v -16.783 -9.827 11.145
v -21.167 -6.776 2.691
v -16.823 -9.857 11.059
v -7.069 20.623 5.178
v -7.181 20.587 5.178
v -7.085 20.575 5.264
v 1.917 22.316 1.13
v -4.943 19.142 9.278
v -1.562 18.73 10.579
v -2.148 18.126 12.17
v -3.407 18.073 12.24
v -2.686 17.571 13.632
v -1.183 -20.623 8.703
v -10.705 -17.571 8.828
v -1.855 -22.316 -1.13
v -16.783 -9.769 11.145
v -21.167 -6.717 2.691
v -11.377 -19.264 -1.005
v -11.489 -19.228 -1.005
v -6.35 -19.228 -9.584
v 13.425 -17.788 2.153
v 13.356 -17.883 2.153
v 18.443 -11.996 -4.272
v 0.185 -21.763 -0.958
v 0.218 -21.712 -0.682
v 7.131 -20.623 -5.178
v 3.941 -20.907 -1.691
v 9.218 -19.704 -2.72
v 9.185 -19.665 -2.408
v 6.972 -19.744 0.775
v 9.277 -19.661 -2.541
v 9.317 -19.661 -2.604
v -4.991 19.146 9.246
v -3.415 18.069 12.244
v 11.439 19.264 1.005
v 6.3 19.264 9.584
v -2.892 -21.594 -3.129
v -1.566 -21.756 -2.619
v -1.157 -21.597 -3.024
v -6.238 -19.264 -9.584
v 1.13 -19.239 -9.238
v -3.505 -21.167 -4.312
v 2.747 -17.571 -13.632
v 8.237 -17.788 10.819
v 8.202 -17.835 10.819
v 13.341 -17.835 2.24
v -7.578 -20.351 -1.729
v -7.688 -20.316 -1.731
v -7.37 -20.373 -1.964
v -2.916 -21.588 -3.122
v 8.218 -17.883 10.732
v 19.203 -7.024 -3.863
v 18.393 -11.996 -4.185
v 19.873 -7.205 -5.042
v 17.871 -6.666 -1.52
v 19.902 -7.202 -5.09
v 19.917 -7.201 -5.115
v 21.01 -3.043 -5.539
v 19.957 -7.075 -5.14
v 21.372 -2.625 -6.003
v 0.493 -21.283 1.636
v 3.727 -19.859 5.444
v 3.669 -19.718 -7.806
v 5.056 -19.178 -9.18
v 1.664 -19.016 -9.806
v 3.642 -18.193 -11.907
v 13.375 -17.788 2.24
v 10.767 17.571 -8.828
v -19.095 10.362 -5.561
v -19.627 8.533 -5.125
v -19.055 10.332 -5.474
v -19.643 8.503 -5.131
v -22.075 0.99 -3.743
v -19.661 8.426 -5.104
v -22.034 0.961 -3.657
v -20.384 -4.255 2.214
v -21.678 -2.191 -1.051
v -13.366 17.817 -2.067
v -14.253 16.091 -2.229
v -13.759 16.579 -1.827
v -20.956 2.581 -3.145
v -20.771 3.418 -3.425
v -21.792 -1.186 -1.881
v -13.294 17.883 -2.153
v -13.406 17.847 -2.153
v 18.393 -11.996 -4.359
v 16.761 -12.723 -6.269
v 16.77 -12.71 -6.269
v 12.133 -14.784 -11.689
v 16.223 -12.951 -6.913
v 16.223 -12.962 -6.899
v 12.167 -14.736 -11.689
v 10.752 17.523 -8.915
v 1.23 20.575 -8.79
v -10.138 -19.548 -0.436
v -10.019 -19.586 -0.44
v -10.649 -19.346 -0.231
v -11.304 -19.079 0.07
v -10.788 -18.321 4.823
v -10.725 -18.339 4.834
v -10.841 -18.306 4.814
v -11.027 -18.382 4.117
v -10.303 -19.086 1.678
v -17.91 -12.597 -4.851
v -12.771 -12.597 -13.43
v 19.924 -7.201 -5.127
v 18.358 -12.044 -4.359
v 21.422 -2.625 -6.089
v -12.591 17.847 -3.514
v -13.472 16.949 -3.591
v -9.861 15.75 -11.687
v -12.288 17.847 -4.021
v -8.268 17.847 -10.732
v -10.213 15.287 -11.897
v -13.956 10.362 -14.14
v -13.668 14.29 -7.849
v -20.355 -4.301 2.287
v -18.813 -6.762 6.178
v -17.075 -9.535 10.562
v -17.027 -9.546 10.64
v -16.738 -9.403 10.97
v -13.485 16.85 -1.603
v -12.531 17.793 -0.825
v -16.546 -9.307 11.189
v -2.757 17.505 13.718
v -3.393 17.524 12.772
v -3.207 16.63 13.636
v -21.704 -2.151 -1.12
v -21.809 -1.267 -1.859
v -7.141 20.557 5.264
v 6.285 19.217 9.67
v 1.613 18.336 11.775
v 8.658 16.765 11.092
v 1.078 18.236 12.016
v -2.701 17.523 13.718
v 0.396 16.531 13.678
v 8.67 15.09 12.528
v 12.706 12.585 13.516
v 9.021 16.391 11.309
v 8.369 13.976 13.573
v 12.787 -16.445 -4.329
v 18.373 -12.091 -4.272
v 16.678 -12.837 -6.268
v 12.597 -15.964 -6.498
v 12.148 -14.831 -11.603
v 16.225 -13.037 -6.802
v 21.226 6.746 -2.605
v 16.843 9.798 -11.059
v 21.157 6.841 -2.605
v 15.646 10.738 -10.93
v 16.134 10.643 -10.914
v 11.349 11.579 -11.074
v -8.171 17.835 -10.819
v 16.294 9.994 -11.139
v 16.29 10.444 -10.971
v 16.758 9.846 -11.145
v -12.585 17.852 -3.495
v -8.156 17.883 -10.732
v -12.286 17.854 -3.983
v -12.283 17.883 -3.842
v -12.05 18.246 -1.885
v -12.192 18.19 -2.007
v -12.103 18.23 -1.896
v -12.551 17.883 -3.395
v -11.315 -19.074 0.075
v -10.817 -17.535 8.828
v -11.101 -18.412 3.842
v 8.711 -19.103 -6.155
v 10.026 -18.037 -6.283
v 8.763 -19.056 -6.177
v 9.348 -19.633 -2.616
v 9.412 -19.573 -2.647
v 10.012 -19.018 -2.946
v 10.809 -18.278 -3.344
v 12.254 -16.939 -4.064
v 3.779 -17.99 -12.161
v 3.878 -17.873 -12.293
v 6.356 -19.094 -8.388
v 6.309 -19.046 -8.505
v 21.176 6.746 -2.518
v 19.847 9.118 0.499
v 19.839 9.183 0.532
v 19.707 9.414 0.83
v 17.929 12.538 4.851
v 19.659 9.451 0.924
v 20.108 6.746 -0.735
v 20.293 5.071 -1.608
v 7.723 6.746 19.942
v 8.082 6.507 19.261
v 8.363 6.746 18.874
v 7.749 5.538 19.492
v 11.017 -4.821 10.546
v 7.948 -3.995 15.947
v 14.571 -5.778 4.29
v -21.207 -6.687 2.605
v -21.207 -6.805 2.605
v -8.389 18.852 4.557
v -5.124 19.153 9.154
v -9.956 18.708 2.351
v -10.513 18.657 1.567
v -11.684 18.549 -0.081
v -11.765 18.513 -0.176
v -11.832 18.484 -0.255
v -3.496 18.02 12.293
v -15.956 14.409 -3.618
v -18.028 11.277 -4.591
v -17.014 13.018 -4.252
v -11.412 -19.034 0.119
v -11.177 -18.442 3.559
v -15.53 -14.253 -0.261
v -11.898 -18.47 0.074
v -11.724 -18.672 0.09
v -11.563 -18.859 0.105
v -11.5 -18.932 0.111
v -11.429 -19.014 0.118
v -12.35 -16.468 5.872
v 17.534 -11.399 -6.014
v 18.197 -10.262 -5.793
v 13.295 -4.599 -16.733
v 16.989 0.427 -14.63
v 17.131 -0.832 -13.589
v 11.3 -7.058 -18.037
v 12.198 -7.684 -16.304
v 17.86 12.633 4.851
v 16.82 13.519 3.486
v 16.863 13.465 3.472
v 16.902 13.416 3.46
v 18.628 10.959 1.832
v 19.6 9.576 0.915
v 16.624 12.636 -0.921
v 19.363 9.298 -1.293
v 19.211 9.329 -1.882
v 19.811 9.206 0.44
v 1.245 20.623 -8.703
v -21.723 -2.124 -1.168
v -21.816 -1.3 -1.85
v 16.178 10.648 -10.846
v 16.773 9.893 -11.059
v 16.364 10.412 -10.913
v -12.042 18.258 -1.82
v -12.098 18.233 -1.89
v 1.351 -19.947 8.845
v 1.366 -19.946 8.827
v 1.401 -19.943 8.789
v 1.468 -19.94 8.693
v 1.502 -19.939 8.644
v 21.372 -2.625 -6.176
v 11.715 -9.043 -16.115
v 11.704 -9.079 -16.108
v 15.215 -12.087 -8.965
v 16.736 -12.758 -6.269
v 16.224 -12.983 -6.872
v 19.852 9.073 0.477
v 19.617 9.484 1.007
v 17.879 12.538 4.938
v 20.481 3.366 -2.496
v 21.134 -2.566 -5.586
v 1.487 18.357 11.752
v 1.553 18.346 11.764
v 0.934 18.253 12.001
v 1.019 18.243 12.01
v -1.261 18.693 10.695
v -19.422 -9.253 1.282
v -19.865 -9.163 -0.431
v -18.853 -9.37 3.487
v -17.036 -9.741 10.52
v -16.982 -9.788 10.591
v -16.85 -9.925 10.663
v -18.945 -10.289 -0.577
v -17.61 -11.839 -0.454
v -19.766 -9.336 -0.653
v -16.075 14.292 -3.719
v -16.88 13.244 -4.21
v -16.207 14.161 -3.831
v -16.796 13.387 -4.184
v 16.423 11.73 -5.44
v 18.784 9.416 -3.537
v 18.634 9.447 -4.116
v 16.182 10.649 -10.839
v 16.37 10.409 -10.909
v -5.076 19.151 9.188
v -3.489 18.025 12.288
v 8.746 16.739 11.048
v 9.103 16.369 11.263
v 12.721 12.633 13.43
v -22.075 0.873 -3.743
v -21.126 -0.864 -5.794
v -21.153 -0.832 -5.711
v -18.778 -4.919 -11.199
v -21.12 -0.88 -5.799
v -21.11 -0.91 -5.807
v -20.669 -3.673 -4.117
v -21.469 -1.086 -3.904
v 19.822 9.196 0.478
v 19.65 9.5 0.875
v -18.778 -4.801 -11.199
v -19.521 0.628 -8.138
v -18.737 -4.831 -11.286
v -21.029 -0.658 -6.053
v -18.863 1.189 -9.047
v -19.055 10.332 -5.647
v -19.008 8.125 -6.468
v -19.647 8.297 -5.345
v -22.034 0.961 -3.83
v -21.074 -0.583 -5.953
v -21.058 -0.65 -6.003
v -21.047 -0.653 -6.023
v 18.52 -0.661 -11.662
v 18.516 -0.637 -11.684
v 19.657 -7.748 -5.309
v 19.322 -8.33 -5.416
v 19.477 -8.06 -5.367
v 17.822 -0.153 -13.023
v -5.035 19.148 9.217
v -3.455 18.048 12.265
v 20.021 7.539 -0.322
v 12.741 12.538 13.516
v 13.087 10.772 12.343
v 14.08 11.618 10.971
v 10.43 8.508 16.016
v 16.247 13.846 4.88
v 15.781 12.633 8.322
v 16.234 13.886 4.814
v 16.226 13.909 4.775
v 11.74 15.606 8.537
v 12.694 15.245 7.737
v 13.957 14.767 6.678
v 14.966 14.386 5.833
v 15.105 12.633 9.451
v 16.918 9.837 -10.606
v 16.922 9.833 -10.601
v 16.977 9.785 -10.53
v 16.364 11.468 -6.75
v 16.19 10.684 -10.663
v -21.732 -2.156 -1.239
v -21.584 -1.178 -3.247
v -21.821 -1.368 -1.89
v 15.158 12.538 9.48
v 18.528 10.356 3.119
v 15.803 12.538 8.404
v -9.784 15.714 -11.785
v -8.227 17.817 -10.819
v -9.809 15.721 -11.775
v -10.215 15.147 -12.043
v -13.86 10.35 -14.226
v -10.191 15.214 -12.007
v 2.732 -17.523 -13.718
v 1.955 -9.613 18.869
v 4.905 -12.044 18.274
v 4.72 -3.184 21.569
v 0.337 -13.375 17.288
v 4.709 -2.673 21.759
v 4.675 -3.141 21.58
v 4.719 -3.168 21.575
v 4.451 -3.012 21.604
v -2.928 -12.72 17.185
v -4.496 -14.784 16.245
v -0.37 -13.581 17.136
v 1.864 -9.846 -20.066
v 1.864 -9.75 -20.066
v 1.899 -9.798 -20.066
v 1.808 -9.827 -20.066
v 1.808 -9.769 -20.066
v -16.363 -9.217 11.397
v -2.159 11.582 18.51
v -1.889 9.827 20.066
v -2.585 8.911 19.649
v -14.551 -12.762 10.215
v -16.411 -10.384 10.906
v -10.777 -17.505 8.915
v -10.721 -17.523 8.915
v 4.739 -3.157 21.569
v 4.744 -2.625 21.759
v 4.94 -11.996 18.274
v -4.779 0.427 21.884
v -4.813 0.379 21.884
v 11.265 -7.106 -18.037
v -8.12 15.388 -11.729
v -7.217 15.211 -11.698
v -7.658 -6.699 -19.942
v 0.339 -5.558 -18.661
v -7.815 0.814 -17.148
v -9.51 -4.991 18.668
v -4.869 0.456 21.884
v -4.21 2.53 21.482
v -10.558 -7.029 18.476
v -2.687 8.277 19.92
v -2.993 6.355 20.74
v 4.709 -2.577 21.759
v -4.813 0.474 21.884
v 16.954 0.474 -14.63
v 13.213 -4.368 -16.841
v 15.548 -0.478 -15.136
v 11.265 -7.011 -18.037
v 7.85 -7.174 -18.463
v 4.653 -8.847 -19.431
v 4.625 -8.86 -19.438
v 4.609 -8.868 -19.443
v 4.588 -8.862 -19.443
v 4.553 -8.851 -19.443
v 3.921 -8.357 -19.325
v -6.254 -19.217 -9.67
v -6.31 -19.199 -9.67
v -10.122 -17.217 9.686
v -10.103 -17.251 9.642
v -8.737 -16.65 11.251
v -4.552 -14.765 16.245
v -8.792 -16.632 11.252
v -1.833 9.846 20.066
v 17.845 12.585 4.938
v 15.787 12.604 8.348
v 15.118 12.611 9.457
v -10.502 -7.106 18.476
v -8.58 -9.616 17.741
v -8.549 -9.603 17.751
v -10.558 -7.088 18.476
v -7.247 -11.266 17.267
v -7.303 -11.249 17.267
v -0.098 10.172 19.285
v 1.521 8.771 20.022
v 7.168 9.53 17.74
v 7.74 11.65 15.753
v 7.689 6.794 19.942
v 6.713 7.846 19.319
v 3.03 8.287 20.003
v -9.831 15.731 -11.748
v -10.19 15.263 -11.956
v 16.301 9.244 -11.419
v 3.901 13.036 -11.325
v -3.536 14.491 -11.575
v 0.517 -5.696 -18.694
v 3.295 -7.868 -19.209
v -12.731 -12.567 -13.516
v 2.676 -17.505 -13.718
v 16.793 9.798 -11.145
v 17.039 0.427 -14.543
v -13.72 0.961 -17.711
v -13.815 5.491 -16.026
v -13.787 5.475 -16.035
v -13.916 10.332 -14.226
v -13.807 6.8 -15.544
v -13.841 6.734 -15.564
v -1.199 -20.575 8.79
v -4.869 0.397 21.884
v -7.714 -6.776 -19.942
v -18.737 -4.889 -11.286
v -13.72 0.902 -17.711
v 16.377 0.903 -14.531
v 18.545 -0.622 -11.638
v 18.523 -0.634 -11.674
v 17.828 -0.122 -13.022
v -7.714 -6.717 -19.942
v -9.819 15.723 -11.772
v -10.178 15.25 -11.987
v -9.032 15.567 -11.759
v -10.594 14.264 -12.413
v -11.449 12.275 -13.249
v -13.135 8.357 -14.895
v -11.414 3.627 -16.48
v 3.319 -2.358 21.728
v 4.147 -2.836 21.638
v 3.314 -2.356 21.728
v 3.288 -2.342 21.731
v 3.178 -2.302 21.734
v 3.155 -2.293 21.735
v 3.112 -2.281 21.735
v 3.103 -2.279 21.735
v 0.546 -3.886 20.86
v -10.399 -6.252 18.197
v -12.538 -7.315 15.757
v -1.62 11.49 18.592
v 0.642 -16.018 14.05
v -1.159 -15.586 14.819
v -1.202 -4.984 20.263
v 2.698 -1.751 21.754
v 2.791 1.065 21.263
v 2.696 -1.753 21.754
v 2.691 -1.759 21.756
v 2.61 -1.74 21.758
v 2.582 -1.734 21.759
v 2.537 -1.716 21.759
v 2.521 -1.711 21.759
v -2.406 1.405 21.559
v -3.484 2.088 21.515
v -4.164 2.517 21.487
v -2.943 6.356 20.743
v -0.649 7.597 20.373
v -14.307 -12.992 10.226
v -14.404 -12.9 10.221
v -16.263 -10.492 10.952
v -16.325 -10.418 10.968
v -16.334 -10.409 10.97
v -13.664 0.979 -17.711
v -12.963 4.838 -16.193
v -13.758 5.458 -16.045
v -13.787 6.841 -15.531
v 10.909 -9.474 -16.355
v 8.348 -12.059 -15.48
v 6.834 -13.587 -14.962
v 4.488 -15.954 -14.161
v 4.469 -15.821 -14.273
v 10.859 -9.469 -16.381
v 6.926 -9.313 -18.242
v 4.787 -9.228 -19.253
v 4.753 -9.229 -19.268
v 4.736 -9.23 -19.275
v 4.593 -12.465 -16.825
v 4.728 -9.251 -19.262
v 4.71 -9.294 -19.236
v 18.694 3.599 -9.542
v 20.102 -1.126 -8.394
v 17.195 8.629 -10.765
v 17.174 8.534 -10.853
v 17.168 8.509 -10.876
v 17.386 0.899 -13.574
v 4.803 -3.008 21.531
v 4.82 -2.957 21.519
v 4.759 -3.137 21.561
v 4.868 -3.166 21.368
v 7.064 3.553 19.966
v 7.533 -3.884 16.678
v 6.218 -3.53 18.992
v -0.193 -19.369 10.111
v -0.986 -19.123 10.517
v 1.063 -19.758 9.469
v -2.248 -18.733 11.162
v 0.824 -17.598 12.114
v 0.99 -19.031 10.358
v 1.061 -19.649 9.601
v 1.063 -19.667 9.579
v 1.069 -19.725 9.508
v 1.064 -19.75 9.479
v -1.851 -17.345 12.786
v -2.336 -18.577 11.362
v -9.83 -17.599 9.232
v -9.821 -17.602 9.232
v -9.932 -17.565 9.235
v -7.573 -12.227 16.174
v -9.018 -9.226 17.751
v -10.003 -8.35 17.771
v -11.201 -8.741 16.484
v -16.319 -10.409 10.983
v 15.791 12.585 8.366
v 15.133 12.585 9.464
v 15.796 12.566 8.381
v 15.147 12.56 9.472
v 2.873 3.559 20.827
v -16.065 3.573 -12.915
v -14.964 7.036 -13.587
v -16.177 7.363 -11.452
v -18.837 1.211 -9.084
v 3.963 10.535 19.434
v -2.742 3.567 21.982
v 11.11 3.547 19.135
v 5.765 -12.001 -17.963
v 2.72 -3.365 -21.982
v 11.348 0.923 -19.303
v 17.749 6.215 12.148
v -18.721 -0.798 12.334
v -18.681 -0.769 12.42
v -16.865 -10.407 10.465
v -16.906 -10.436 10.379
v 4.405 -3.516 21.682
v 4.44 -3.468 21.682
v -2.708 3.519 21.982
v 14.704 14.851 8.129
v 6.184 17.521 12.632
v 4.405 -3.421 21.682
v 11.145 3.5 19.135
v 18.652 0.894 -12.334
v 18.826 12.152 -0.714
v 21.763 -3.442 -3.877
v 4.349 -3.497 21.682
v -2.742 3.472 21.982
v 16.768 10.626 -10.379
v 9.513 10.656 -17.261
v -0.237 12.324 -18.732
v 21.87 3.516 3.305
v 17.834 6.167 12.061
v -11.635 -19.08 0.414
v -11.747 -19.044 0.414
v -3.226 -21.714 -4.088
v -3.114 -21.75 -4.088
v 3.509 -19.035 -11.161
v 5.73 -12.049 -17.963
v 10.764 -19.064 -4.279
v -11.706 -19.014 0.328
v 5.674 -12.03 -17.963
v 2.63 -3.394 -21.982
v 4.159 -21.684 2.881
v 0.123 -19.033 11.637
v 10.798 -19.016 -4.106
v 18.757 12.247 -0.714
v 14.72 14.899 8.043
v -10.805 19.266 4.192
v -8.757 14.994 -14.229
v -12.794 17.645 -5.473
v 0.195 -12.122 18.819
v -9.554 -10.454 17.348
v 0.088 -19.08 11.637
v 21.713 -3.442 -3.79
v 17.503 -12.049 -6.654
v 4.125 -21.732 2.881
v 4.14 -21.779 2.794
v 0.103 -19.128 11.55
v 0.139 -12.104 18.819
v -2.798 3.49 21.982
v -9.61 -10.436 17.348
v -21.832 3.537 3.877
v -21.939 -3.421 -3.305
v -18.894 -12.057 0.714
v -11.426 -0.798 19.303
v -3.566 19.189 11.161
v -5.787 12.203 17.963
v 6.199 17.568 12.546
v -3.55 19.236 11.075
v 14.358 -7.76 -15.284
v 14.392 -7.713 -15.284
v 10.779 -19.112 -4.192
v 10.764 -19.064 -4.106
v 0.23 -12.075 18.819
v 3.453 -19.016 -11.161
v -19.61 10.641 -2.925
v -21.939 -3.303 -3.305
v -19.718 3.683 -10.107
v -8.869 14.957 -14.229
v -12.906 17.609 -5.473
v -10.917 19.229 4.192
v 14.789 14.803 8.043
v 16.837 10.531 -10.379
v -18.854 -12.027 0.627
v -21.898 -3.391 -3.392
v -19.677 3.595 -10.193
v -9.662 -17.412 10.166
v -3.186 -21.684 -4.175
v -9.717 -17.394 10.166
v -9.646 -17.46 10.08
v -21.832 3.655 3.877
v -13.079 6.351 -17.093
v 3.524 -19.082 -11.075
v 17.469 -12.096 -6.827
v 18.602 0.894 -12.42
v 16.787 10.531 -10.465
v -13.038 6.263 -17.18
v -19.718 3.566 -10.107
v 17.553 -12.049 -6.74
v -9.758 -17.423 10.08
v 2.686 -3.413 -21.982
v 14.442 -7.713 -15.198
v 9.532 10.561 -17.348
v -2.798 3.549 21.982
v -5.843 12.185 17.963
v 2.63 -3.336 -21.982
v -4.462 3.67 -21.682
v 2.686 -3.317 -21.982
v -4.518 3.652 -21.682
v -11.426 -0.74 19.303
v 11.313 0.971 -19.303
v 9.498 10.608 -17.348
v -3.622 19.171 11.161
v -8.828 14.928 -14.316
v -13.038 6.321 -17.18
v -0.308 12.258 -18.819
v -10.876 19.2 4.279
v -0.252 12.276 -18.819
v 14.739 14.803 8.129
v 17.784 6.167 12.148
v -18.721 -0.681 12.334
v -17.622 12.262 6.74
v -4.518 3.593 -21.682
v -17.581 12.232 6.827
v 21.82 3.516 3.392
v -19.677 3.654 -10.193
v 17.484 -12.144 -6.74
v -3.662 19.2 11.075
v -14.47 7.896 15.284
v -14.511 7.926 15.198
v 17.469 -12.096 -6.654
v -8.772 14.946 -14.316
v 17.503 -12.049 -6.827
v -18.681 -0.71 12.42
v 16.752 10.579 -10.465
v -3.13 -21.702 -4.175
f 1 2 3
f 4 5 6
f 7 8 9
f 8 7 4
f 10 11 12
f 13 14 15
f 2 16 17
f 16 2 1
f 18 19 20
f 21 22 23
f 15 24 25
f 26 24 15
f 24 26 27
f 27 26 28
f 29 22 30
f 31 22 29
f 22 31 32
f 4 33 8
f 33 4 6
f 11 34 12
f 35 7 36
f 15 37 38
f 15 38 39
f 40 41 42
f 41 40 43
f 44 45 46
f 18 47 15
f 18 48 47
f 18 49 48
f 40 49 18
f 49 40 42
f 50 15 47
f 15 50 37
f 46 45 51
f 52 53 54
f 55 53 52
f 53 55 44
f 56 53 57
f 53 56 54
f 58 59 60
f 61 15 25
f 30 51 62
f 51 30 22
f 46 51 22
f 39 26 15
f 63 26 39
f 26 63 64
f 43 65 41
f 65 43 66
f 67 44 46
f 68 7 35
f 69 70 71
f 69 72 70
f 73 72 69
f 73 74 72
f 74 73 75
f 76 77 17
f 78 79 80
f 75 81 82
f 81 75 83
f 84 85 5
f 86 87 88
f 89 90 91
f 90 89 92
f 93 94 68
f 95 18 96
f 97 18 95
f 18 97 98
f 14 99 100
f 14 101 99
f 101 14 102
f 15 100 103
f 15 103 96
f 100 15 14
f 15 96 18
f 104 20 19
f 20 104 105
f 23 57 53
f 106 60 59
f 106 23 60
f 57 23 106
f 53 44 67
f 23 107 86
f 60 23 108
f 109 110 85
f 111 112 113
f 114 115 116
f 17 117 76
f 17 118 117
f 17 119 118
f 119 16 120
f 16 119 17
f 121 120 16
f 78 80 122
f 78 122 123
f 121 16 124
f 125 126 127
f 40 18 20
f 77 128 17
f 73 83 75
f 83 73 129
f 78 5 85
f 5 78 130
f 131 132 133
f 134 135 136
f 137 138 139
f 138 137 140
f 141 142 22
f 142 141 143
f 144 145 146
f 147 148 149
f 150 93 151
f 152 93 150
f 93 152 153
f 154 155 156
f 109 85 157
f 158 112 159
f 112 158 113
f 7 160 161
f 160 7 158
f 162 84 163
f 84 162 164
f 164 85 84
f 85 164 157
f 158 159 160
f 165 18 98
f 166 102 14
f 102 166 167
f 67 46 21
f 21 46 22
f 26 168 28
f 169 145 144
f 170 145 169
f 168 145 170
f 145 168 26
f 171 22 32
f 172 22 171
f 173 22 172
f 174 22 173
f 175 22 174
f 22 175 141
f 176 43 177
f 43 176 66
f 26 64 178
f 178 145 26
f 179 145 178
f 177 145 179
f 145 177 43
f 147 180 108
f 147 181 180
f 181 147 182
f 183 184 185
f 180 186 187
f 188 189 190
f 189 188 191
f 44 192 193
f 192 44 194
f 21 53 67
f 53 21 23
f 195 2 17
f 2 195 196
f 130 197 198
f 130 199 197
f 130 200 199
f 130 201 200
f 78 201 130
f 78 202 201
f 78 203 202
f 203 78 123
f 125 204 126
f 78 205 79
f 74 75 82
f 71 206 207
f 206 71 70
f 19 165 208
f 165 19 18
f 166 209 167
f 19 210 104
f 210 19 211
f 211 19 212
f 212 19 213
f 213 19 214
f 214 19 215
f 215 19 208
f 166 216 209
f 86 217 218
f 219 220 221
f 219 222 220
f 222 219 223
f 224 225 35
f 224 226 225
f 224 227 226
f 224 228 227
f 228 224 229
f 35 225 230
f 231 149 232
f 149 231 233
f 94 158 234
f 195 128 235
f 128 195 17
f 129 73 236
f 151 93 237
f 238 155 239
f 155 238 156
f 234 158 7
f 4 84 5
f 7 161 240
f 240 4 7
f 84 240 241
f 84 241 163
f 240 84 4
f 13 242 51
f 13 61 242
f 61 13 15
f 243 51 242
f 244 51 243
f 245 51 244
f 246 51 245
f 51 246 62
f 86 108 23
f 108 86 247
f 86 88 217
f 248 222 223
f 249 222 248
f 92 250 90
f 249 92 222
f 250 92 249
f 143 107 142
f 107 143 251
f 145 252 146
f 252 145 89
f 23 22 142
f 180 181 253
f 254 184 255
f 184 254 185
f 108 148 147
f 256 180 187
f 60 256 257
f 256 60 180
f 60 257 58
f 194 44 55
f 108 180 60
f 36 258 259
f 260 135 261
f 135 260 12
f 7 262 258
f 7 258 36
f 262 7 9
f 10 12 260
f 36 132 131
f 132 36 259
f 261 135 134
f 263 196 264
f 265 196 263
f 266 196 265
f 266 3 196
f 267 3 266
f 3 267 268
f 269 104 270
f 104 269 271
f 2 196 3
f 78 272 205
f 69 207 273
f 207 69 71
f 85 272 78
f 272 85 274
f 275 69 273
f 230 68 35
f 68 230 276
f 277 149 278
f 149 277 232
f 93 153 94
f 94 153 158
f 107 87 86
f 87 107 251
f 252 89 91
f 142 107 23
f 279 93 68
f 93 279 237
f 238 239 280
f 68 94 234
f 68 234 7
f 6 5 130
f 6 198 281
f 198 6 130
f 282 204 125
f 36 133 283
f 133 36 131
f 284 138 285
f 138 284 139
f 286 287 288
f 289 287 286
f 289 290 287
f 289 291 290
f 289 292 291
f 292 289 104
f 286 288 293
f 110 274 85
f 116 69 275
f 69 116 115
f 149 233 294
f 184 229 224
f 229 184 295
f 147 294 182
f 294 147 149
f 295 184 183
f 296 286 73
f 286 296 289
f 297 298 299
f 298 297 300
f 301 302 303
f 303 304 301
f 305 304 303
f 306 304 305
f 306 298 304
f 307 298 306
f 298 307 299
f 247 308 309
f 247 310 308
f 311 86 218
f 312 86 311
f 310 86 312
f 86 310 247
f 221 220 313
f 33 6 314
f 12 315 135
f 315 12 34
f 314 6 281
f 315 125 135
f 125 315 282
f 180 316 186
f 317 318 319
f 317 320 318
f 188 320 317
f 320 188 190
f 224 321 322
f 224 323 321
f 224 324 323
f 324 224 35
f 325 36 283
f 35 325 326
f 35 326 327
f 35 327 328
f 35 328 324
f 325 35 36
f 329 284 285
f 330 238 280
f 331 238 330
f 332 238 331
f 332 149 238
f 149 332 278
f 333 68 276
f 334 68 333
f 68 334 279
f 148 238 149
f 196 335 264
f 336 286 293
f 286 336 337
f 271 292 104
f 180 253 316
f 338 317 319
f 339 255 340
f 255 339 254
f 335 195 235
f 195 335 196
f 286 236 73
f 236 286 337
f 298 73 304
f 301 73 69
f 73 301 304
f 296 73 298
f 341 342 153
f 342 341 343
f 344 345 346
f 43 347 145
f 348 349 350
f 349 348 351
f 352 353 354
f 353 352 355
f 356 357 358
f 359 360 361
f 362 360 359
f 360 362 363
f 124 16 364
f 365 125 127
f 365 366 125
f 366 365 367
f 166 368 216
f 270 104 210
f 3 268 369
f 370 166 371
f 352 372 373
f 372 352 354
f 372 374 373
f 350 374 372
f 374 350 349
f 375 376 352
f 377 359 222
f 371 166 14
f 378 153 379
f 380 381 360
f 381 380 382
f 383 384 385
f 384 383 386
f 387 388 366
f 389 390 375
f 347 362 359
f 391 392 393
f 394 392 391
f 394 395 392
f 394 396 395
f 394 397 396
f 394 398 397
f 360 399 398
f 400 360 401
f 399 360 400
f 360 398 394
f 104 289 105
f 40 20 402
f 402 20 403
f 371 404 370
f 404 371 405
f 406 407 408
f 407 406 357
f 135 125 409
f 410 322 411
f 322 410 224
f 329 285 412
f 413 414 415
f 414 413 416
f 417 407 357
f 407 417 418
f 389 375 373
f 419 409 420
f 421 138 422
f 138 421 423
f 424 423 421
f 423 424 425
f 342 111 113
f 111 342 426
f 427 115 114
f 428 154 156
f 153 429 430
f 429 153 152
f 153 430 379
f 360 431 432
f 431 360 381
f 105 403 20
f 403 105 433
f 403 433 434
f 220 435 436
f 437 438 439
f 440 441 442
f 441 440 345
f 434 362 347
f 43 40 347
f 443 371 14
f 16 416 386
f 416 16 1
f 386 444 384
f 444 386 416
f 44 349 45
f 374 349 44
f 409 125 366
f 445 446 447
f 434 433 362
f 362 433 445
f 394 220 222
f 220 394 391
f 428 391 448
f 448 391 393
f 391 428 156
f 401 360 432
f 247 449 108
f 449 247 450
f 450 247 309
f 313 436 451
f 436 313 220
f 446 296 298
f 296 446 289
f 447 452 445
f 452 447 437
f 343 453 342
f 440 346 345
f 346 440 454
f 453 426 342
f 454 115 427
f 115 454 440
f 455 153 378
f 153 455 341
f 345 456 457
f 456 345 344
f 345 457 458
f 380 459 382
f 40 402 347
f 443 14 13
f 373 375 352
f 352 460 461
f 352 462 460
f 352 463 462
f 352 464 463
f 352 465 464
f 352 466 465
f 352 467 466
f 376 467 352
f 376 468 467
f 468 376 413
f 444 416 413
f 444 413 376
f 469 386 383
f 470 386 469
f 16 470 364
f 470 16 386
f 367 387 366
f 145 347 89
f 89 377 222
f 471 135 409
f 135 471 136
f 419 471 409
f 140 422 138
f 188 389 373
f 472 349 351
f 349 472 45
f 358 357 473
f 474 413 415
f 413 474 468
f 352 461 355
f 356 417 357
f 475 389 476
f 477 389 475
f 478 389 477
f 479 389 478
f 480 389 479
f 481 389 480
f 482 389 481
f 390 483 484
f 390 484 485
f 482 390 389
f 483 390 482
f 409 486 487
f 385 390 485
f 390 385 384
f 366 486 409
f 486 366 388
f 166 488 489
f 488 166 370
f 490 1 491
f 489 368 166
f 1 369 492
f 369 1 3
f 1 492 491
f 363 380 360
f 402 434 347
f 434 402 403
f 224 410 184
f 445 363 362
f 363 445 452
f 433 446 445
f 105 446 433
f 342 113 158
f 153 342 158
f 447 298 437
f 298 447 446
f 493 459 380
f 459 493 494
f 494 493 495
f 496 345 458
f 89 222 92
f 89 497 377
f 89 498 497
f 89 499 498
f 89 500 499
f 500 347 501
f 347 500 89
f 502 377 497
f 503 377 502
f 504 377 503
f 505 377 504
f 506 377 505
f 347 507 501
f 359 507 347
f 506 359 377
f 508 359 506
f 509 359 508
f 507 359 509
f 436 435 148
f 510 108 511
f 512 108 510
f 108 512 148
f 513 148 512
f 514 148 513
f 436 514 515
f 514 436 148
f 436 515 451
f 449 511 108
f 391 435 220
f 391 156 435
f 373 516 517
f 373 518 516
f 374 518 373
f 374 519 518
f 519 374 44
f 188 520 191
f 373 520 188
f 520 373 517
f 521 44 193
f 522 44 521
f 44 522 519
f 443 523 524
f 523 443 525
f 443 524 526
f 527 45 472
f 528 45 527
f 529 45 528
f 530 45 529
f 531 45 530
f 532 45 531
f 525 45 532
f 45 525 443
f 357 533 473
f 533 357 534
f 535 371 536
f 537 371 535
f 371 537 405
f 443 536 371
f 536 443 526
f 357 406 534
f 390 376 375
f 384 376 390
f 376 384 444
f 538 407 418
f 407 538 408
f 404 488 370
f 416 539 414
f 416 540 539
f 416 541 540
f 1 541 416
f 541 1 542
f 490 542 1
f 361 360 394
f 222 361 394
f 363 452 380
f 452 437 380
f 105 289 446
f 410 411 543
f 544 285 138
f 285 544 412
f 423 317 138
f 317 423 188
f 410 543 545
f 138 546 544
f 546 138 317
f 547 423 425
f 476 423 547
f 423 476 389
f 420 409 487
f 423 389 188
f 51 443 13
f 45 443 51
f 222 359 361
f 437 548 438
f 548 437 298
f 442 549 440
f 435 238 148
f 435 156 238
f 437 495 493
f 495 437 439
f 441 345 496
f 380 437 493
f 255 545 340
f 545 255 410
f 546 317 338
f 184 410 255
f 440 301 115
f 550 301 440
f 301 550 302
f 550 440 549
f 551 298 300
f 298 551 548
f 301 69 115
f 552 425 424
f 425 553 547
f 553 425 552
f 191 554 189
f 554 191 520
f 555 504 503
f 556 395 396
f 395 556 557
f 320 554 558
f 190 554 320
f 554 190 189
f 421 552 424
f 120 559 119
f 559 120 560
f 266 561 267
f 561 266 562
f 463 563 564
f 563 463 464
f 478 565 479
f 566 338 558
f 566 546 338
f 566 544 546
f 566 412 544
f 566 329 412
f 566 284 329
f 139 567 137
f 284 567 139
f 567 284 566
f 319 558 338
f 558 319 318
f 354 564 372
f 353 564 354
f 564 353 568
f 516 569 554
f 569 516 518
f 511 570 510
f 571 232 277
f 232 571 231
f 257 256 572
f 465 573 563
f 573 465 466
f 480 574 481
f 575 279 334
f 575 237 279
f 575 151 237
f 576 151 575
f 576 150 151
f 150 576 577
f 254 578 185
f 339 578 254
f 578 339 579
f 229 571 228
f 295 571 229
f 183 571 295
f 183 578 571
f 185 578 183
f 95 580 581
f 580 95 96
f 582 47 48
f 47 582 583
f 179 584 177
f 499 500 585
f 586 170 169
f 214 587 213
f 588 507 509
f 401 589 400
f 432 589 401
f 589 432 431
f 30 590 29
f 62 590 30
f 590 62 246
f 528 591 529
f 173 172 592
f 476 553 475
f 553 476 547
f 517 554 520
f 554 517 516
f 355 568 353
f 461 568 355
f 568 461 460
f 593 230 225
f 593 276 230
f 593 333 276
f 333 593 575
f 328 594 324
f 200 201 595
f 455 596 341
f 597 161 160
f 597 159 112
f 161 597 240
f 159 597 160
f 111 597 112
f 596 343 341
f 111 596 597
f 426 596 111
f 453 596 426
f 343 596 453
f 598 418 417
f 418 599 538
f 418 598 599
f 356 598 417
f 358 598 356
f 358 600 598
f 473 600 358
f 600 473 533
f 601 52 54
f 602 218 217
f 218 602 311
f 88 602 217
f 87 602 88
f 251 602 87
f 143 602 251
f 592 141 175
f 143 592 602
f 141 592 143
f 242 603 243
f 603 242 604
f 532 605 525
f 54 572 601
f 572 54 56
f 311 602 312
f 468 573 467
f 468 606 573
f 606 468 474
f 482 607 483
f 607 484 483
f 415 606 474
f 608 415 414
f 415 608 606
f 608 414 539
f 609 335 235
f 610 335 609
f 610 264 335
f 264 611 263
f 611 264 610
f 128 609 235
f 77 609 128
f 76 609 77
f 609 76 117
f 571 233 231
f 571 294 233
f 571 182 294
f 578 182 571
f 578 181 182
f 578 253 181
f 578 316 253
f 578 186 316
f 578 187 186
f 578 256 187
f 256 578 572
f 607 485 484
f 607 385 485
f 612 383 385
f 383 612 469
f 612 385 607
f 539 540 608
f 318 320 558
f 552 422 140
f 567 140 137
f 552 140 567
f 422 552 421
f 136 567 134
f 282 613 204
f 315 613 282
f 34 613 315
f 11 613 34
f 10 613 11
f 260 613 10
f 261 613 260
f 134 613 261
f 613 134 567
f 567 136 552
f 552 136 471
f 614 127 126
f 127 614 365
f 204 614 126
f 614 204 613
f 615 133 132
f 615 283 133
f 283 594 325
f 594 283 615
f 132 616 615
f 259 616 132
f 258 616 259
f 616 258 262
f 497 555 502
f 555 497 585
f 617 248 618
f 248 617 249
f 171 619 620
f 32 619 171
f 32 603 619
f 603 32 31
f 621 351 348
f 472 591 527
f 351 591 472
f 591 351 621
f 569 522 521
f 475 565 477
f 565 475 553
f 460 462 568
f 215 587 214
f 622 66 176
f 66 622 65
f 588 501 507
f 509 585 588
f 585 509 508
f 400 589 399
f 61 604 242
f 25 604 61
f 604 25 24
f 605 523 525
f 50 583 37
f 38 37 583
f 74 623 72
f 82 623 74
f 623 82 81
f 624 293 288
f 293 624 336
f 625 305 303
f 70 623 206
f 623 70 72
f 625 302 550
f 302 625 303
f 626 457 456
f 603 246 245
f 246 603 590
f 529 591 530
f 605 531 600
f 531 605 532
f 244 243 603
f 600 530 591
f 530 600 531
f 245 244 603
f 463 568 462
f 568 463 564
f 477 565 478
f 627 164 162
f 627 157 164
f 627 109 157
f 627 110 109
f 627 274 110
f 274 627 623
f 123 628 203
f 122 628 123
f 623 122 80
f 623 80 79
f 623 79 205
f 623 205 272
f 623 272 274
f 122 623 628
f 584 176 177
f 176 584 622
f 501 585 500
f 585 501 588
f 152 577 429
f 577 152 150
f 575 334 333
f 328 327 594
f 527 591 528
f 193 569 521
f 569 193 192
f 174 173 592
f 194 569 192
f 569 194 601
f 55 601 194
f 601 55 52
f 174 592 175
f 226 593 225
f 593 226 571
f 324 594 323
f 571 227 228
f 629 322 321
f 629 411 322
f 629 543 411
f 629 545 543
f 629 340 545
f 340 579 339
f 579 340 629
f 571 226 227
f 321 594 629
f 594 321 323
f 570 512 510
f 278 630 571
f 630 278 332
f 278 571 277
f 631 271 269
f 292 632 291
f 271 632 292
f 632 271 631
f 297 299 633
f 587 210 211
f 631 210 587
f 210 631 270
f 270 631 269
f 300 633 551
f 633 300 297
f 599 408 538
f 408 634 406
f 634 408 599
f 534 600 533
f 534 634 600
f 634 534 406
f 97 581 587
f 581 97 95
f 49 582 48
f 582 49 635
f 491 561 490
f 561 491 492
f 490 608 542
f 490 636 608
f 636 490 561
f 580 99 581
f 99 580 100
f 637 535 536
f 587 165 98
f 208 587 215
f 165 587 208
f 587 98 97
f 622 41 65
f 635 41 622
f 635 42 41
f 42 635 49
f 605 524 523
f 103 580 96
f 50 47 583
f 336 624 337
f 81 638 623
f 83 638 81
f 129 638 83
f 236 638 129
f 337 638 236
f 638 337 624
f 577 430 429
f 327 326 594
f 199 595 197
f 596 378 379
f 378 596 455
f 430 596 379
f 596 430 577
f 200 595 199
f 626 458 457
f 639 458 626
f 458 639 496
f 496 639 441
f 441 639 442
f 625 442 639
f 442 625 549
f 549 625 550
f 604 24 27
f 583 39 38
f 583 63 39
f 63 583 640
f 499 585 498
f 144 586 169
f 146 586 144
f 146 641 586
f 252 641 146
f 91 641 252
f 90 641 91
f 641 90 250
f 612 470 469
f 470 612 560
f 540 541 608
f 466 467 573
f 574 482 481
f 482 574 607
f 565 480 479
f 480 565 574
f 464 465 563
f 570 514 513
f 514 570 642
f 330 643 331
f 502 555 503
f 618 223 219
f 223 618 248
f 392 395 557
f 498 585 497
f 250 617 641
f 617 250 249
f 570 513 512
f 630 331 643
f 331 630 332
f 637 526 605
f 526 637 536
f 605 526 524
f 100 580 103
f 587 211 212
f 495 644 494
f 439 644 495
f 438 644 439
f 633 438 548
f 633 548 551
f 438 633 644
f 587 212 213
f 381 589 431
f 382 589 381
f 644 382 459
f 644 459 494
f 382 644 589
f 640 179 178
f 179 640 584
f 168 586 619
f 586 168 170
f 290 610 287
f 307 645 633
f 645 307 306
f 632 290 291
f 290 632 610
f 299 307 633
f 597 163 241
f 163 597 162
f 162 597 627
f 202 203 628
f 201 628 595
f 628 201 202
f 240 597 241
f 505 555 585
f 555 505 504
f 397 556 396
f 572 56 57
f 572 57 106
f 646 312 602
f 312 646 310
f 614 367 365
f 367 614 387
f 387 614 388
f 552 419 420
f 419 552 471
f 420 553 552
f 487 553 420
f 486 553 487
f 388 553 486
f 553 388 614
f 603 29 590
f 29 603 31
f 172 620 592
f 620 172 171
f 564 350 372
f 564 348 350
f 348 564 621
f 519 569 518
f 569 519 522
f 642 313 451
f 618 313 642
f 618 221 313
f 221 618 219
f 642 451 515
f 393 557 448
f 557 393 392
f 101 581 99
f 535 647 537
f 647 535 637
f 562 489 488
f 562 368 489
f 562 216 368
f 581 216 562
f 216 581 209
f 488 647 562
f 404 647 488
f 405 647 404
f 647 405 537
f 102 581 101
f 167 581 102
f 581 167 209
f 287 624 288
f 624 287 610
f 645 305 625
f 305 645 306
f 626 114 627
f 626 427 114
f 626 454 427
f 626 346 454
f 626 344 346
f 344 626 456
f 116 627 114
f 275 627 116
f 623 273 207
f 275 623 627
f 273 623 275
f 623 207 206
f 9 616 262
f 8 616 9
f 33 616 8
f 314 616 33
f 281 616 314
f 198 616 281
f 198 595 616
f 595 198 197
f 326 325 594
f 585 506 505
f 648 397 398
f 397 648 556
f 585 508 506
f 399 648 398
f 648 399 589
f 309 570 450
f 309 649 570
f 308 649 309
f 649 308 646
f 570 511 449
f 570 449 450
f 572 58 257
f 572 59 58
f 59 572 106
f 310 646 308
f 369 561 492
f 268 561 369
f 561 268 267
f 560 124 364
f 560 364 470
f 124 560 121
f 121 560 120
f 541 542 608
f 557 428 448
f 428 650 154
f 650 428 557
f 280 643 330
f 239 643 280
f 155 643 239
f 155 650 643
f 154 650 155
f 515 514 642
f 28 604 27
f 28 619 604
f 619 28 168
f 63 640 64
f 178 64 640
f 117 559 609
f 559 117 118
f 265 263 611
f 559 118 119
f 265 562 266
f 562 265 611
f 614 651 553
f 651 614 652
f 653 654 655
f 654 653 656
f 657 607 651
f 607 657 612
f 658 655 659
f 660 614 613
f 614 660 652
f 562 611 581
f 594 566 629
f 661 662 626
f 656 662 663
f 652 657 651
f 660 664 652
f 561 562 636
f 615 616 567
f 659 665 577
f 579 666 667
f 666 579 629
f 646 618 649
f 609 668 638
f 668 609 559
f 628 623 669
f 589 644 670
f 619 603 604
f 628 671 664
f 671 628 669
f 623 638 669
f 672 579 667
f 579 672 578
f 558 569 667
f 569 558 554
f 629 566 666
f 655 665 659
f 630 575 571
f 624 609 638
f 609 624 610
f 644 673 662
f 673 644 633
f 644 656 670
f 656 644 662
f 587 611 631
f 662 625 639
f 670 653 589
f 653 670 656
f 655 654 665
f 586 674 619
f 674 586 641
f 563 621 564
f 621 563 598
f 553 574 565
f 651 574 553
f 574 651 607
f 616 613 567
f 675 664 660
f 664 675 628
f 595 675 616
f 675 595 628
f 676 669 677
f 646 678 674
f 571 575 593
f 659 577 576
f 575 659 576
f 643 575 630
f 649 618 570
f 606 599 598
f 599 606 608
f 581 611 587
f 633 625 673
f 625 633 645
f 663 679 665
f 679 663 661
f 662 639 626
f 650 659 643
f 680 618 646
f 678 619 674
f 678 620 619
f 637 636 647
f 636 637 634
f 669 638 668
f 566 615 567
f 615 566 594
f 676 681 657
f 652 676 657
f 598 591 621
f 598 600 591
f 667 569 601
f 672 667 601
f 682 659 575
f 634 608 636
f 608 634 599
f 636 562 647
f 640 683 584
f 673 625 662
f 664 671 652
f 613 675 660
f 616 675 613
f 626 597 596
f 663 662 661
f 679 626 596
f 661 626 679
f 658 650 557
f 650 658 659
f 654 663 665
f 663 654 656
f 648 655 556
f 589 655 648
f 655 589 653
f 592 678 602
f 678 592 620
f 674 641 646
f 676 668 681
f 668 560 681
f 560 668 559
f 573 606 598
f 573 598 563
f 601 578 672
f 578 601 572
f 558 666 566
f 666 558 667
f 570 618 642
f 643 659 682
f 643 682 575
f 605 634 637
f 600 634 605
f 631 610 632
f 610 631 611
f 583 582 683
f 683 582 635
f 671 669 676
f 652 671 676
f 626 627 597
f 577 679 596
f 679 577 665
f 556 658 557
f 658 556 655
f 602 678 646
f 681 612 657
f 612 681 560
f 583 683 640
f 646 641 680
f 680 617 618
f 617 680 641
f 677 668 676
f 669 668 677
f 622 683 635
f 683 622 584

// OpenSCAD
// Auto-generated OpenSCAD file

    inner_points = 10*[[2.1663170564831677, -0.34419785617257703, -0.38765607758297516], [-1.442996025981491, 0.7866986144158923, 1.519751628063399], [1.8552345149142868, 0.08938090208747582, -1.233372999913796], [-1.7540785675503718, 1.2202773726759453, 0.6740347057325782], [1.7453064030745096, -1.2048588295271065, -0.6740347057325782], [-1.864006679390149, -0.07396235893863715, 1.233372999913796], [1.4342238615056286, -0.7712800712670536, -1.519751628063399], [-2.1750892209590305, 0.35961639932141576, 0.38765607758297516], [1.468891681862331, 1.4803448655131184, 0.8042791895681101], [0.6168484423213675, 1.7473133080865888, 1.2545570689075638], [-0.31453806522834865, -2.1654735231978033, -0.4088401465767429], [-1.1665813047693123, -1.8985050806243329, 0.0414377327627109], [0.43898102104550846, -0.34681056725634735, 2.1595854401021617], [-0.026742532112712505, 1.2228900837597156, -1.873206811952559], [-0.8787857716536761, 1.489858526333186, -1.4229289326131052], [0.0179703676368501, -1.207471540610877, 1.873206811952559], [-0.44775318552137083, 0.36222911040518607, -2.1595854401021617], [-1.2997964250623344, 0.6291975529786564, -1.7093075607627082], [-1.1385344489428022, -0.0769022418107572, 1.921618159677706], [1.12976228446694, 0.09232078495959586, -1.921618159677706], [-1.9529591160768351, 1.0582216841140362, -0.29249748784533813], [1.872568425092638, 1.215193370477562, -0.07135759109804152], [-0.358109735910173, 1.914125827058532, 1.1074852013948724], [0.3493375714343106, -1.8987072839096932, -1.1074852013948724], [-1.8813405895685003, -1.1997748273287232, 0.07135759109804152], [1.1094776222383604, 0.34997776999835917, 1.9047907760005465], [0.007257421988691212, -1.903261911034367, 1.1550417938533186], [2.1770300021313265, 0.35159251425091276, 0.33050894051626534], [-0.5802398407923681, 1.2155205422659117, 1.7876387668231855], [1.673687876566175, 1.0531376819156528, -1.0378897846759576], [-1.0835819663575201, 1.9170657099306518, 0.4192400416309626], [1.0748098018816579, -1.9016471667818131, -0.4192400416309626], [-1.6824600410420372, -1.037719138766814, 1.0378897846759576], [0.5714676763165056, -1.200101999117073, -1.7876387668231855], [-2.185802166607189, -0.33617397110207403, -0.33050894051626534], [1.7733532589010197, 0.6167440092864692, 1.206145721182417], [0.3947183374391723, 1.0487080232939685, 1.9347106343358773], [0.4109341652189982, -2.168413406069923, 0.2794050131871669], [-0.9677007562428493, -1.736449392062424, 1.0079699263406272], [-0.2757782637536796, 0.35191968603926227, 2.1895052984374925], [0.948215646118828, 1.056077564787773, -1.7261349444398677], [-1.282462514883983, 1.7550100213687425, -0.5472921519469536], [-0.9569878105946905, -1.0406590216389342, 1.7261349444398677], [0.2670060992778172, -0.33650114289042354, -2.1895052984374925], [-1.9636720617249939, 0.3624313136905462, -1.0106625059445786]];

    outer_points = 10*[[1.269058091079478, 1.2537842356028754, 1.3429760346034532], [-1.1407886362053834, -1.916917683440805, -0.10047815641416535], [0.6269353347347499, 1.916917683440805, 0.9583562273355116], [-1.7829113925501114, -1.2537842356028754, -0.4850979636821068], [1.7829113925501114, 1.2537842356028754, 0.4850979636821068], [-0.6269353347347499, -1.916917683440805, -0.9583562273355116], [1.1407886362053834, 1.916917683440805, 0.10047815641416535], [-1.269058091079478, -1.2537842356028754, -1.3429760346034532], [-0.48285355807647146, 0.04268387072270685, 2.179701471792137], [-1.0517412010710958, -0.7058173185606367, 1.8389481603050128], [1.693863957415824, 0.04268387072270685, -1.4543283530370714], [1.1249763144211997, -0.7058173185606367, -1.7950816645241956], [0.8186673506552729, -1.7787897762393126, 1.073200204257045], [-1.3325206521259063, 1.7787897762393126, -0.21532213333569883], [-1.9014082951205304, 1.0302885869559693, -0.556075444822823], [1.3325206521259063, -1.7787897762393126, 0.21532213333569883], [-0.8186673506552729, 1.7787897762393126, -1.073200204257045], [-1.387554993649897, 1.0302885869559693, -1.4139535157441694], [-0.18857781353705078, -2.2221043244817307, -0.11295466728279542], [0.18857781353705078, 2.2221043244817307, 0.11295466728279542], [-1.8696770145973163, -0.48599841896512486, -1.1199023954567], [-0.1848857624061775, 0.979800777081756, 1.9979678850244973], [-1.6742529475459202, -0.979800777081756, 1.1058641337721262], [1.6742529475459202, 0.979800777081756, -1.1058641337721262], [0.1848857624061775, -0.979800777081756, -1.9979678850244973], [0.4889682744617646, -1.1996196766772678, 1.8187607416585618], [1.834253682943229, -1.1996196766772678, -0.42719320621671564], [0.7673250602621547, 0.6746141360408304, 1.9854913741558673], [-1.073634024028082, -1.7475865937195063, 0.8827904946253733], [-0.27165138445338266, 1.7475865937195063, 1.3631634532499042], [-2.112610468743619, -0.6746141360408304, 0.26046257371941006], [2.112610468743619, 0.6746141360408304, -0.26046257371941006], [0.27165138445338266, -1.7475865937195063, -1.3631634532499042], [1.073634024028082, 1.7475865937195063, -0.8827904946253733], [-0.7673250602621547, -0.6746141360408304, -1.9854913741558673], [0.469357264591861, -0.26250277031821867, 2.167224960923507], [-0.4511222775532575, -1.473603135198387, 1.6158745211582601], [2.1322214786135234, -0.26250277031821867, -0.6089267929843553], [1.2117419364684048, -1.473603135198387, -1.1602772327496023], [-0.12142320135974954, -2.0527732347604317, 0.8703139837567432], [-0.7100089056510817, 2.0527732347604317, 0.517761893197188], [-2.1993760907908246, 0.09317168059691994, -0.3743418580551833], [0.7100089056510817, -2.0527732347604317, -0.517761893197188], [0.12142320135974954, 2.0527732347604317, -0.8703139837567432], [-1.3679439837799934, 0.09317168059691994, -1.7624177350091146]];

    // Convex hull for inner set (I)
    module inner_hull() {
        hull() {
            for (p = inner_points) {
                translate(p) sphere(r=0.1);
            }
        }
    }

    // Convex hull for outer set (O) minus inner hull (O \ I)
    module outer_minus_inner() {
        difference() {
            hull() {
                for (p = outer_points) {
                    translate(p) sphere(r=0.1);
                }
            }
            inner_hull(); // Subtract inner hull
        }
    }

    // Convex hull for outer set (O) minus all translated inner hulls
    module outer_minus_AllTranslationInner() {
        difference() {
            hull() {
                for (p = outer_points) {
                    translate(p) sphere(r=0.1);
                }
            }
            hull() {
                translate([0,0,50]) inner_hull();
                translate([0,0,-50]) inner_hull();
            }; // Subtract translated inner hulls
        }
    }

    // Difference between outer_minus_inner and outer_minus_AllTranslationInner
    module outer_minus_inner_diff() {
        difference() {
            // Outer minus inner
            difference() {
                hull() {
                    for (p = outer_points) {
                        translate(p) sphere(r=0.1);
                    }
                }
                inner_hull();
            }

            // Subtract Outer minus AllTranslationInner
            difference() {
                hull() {
                    for (p = outer_points) {
                        translate(p) sphere(r=0.1);
                    }
                }
                hull() {
                    translate([0,0,50]) inner_hull();
                    translate([0,0,-50]) inner_hull();
                };
            }
        }
    }

    // Rendering all with colors applied
    color([1, 0, 0, 0.5]) inner_hull(); // Transparent red
    color([0, 1, 0, 1]) outer_minus_AllTranslationInner(); // Opaque green
    color([1, 1, 0, 1]) outer_minus_inner_diff(); // Opaque yellow
    
